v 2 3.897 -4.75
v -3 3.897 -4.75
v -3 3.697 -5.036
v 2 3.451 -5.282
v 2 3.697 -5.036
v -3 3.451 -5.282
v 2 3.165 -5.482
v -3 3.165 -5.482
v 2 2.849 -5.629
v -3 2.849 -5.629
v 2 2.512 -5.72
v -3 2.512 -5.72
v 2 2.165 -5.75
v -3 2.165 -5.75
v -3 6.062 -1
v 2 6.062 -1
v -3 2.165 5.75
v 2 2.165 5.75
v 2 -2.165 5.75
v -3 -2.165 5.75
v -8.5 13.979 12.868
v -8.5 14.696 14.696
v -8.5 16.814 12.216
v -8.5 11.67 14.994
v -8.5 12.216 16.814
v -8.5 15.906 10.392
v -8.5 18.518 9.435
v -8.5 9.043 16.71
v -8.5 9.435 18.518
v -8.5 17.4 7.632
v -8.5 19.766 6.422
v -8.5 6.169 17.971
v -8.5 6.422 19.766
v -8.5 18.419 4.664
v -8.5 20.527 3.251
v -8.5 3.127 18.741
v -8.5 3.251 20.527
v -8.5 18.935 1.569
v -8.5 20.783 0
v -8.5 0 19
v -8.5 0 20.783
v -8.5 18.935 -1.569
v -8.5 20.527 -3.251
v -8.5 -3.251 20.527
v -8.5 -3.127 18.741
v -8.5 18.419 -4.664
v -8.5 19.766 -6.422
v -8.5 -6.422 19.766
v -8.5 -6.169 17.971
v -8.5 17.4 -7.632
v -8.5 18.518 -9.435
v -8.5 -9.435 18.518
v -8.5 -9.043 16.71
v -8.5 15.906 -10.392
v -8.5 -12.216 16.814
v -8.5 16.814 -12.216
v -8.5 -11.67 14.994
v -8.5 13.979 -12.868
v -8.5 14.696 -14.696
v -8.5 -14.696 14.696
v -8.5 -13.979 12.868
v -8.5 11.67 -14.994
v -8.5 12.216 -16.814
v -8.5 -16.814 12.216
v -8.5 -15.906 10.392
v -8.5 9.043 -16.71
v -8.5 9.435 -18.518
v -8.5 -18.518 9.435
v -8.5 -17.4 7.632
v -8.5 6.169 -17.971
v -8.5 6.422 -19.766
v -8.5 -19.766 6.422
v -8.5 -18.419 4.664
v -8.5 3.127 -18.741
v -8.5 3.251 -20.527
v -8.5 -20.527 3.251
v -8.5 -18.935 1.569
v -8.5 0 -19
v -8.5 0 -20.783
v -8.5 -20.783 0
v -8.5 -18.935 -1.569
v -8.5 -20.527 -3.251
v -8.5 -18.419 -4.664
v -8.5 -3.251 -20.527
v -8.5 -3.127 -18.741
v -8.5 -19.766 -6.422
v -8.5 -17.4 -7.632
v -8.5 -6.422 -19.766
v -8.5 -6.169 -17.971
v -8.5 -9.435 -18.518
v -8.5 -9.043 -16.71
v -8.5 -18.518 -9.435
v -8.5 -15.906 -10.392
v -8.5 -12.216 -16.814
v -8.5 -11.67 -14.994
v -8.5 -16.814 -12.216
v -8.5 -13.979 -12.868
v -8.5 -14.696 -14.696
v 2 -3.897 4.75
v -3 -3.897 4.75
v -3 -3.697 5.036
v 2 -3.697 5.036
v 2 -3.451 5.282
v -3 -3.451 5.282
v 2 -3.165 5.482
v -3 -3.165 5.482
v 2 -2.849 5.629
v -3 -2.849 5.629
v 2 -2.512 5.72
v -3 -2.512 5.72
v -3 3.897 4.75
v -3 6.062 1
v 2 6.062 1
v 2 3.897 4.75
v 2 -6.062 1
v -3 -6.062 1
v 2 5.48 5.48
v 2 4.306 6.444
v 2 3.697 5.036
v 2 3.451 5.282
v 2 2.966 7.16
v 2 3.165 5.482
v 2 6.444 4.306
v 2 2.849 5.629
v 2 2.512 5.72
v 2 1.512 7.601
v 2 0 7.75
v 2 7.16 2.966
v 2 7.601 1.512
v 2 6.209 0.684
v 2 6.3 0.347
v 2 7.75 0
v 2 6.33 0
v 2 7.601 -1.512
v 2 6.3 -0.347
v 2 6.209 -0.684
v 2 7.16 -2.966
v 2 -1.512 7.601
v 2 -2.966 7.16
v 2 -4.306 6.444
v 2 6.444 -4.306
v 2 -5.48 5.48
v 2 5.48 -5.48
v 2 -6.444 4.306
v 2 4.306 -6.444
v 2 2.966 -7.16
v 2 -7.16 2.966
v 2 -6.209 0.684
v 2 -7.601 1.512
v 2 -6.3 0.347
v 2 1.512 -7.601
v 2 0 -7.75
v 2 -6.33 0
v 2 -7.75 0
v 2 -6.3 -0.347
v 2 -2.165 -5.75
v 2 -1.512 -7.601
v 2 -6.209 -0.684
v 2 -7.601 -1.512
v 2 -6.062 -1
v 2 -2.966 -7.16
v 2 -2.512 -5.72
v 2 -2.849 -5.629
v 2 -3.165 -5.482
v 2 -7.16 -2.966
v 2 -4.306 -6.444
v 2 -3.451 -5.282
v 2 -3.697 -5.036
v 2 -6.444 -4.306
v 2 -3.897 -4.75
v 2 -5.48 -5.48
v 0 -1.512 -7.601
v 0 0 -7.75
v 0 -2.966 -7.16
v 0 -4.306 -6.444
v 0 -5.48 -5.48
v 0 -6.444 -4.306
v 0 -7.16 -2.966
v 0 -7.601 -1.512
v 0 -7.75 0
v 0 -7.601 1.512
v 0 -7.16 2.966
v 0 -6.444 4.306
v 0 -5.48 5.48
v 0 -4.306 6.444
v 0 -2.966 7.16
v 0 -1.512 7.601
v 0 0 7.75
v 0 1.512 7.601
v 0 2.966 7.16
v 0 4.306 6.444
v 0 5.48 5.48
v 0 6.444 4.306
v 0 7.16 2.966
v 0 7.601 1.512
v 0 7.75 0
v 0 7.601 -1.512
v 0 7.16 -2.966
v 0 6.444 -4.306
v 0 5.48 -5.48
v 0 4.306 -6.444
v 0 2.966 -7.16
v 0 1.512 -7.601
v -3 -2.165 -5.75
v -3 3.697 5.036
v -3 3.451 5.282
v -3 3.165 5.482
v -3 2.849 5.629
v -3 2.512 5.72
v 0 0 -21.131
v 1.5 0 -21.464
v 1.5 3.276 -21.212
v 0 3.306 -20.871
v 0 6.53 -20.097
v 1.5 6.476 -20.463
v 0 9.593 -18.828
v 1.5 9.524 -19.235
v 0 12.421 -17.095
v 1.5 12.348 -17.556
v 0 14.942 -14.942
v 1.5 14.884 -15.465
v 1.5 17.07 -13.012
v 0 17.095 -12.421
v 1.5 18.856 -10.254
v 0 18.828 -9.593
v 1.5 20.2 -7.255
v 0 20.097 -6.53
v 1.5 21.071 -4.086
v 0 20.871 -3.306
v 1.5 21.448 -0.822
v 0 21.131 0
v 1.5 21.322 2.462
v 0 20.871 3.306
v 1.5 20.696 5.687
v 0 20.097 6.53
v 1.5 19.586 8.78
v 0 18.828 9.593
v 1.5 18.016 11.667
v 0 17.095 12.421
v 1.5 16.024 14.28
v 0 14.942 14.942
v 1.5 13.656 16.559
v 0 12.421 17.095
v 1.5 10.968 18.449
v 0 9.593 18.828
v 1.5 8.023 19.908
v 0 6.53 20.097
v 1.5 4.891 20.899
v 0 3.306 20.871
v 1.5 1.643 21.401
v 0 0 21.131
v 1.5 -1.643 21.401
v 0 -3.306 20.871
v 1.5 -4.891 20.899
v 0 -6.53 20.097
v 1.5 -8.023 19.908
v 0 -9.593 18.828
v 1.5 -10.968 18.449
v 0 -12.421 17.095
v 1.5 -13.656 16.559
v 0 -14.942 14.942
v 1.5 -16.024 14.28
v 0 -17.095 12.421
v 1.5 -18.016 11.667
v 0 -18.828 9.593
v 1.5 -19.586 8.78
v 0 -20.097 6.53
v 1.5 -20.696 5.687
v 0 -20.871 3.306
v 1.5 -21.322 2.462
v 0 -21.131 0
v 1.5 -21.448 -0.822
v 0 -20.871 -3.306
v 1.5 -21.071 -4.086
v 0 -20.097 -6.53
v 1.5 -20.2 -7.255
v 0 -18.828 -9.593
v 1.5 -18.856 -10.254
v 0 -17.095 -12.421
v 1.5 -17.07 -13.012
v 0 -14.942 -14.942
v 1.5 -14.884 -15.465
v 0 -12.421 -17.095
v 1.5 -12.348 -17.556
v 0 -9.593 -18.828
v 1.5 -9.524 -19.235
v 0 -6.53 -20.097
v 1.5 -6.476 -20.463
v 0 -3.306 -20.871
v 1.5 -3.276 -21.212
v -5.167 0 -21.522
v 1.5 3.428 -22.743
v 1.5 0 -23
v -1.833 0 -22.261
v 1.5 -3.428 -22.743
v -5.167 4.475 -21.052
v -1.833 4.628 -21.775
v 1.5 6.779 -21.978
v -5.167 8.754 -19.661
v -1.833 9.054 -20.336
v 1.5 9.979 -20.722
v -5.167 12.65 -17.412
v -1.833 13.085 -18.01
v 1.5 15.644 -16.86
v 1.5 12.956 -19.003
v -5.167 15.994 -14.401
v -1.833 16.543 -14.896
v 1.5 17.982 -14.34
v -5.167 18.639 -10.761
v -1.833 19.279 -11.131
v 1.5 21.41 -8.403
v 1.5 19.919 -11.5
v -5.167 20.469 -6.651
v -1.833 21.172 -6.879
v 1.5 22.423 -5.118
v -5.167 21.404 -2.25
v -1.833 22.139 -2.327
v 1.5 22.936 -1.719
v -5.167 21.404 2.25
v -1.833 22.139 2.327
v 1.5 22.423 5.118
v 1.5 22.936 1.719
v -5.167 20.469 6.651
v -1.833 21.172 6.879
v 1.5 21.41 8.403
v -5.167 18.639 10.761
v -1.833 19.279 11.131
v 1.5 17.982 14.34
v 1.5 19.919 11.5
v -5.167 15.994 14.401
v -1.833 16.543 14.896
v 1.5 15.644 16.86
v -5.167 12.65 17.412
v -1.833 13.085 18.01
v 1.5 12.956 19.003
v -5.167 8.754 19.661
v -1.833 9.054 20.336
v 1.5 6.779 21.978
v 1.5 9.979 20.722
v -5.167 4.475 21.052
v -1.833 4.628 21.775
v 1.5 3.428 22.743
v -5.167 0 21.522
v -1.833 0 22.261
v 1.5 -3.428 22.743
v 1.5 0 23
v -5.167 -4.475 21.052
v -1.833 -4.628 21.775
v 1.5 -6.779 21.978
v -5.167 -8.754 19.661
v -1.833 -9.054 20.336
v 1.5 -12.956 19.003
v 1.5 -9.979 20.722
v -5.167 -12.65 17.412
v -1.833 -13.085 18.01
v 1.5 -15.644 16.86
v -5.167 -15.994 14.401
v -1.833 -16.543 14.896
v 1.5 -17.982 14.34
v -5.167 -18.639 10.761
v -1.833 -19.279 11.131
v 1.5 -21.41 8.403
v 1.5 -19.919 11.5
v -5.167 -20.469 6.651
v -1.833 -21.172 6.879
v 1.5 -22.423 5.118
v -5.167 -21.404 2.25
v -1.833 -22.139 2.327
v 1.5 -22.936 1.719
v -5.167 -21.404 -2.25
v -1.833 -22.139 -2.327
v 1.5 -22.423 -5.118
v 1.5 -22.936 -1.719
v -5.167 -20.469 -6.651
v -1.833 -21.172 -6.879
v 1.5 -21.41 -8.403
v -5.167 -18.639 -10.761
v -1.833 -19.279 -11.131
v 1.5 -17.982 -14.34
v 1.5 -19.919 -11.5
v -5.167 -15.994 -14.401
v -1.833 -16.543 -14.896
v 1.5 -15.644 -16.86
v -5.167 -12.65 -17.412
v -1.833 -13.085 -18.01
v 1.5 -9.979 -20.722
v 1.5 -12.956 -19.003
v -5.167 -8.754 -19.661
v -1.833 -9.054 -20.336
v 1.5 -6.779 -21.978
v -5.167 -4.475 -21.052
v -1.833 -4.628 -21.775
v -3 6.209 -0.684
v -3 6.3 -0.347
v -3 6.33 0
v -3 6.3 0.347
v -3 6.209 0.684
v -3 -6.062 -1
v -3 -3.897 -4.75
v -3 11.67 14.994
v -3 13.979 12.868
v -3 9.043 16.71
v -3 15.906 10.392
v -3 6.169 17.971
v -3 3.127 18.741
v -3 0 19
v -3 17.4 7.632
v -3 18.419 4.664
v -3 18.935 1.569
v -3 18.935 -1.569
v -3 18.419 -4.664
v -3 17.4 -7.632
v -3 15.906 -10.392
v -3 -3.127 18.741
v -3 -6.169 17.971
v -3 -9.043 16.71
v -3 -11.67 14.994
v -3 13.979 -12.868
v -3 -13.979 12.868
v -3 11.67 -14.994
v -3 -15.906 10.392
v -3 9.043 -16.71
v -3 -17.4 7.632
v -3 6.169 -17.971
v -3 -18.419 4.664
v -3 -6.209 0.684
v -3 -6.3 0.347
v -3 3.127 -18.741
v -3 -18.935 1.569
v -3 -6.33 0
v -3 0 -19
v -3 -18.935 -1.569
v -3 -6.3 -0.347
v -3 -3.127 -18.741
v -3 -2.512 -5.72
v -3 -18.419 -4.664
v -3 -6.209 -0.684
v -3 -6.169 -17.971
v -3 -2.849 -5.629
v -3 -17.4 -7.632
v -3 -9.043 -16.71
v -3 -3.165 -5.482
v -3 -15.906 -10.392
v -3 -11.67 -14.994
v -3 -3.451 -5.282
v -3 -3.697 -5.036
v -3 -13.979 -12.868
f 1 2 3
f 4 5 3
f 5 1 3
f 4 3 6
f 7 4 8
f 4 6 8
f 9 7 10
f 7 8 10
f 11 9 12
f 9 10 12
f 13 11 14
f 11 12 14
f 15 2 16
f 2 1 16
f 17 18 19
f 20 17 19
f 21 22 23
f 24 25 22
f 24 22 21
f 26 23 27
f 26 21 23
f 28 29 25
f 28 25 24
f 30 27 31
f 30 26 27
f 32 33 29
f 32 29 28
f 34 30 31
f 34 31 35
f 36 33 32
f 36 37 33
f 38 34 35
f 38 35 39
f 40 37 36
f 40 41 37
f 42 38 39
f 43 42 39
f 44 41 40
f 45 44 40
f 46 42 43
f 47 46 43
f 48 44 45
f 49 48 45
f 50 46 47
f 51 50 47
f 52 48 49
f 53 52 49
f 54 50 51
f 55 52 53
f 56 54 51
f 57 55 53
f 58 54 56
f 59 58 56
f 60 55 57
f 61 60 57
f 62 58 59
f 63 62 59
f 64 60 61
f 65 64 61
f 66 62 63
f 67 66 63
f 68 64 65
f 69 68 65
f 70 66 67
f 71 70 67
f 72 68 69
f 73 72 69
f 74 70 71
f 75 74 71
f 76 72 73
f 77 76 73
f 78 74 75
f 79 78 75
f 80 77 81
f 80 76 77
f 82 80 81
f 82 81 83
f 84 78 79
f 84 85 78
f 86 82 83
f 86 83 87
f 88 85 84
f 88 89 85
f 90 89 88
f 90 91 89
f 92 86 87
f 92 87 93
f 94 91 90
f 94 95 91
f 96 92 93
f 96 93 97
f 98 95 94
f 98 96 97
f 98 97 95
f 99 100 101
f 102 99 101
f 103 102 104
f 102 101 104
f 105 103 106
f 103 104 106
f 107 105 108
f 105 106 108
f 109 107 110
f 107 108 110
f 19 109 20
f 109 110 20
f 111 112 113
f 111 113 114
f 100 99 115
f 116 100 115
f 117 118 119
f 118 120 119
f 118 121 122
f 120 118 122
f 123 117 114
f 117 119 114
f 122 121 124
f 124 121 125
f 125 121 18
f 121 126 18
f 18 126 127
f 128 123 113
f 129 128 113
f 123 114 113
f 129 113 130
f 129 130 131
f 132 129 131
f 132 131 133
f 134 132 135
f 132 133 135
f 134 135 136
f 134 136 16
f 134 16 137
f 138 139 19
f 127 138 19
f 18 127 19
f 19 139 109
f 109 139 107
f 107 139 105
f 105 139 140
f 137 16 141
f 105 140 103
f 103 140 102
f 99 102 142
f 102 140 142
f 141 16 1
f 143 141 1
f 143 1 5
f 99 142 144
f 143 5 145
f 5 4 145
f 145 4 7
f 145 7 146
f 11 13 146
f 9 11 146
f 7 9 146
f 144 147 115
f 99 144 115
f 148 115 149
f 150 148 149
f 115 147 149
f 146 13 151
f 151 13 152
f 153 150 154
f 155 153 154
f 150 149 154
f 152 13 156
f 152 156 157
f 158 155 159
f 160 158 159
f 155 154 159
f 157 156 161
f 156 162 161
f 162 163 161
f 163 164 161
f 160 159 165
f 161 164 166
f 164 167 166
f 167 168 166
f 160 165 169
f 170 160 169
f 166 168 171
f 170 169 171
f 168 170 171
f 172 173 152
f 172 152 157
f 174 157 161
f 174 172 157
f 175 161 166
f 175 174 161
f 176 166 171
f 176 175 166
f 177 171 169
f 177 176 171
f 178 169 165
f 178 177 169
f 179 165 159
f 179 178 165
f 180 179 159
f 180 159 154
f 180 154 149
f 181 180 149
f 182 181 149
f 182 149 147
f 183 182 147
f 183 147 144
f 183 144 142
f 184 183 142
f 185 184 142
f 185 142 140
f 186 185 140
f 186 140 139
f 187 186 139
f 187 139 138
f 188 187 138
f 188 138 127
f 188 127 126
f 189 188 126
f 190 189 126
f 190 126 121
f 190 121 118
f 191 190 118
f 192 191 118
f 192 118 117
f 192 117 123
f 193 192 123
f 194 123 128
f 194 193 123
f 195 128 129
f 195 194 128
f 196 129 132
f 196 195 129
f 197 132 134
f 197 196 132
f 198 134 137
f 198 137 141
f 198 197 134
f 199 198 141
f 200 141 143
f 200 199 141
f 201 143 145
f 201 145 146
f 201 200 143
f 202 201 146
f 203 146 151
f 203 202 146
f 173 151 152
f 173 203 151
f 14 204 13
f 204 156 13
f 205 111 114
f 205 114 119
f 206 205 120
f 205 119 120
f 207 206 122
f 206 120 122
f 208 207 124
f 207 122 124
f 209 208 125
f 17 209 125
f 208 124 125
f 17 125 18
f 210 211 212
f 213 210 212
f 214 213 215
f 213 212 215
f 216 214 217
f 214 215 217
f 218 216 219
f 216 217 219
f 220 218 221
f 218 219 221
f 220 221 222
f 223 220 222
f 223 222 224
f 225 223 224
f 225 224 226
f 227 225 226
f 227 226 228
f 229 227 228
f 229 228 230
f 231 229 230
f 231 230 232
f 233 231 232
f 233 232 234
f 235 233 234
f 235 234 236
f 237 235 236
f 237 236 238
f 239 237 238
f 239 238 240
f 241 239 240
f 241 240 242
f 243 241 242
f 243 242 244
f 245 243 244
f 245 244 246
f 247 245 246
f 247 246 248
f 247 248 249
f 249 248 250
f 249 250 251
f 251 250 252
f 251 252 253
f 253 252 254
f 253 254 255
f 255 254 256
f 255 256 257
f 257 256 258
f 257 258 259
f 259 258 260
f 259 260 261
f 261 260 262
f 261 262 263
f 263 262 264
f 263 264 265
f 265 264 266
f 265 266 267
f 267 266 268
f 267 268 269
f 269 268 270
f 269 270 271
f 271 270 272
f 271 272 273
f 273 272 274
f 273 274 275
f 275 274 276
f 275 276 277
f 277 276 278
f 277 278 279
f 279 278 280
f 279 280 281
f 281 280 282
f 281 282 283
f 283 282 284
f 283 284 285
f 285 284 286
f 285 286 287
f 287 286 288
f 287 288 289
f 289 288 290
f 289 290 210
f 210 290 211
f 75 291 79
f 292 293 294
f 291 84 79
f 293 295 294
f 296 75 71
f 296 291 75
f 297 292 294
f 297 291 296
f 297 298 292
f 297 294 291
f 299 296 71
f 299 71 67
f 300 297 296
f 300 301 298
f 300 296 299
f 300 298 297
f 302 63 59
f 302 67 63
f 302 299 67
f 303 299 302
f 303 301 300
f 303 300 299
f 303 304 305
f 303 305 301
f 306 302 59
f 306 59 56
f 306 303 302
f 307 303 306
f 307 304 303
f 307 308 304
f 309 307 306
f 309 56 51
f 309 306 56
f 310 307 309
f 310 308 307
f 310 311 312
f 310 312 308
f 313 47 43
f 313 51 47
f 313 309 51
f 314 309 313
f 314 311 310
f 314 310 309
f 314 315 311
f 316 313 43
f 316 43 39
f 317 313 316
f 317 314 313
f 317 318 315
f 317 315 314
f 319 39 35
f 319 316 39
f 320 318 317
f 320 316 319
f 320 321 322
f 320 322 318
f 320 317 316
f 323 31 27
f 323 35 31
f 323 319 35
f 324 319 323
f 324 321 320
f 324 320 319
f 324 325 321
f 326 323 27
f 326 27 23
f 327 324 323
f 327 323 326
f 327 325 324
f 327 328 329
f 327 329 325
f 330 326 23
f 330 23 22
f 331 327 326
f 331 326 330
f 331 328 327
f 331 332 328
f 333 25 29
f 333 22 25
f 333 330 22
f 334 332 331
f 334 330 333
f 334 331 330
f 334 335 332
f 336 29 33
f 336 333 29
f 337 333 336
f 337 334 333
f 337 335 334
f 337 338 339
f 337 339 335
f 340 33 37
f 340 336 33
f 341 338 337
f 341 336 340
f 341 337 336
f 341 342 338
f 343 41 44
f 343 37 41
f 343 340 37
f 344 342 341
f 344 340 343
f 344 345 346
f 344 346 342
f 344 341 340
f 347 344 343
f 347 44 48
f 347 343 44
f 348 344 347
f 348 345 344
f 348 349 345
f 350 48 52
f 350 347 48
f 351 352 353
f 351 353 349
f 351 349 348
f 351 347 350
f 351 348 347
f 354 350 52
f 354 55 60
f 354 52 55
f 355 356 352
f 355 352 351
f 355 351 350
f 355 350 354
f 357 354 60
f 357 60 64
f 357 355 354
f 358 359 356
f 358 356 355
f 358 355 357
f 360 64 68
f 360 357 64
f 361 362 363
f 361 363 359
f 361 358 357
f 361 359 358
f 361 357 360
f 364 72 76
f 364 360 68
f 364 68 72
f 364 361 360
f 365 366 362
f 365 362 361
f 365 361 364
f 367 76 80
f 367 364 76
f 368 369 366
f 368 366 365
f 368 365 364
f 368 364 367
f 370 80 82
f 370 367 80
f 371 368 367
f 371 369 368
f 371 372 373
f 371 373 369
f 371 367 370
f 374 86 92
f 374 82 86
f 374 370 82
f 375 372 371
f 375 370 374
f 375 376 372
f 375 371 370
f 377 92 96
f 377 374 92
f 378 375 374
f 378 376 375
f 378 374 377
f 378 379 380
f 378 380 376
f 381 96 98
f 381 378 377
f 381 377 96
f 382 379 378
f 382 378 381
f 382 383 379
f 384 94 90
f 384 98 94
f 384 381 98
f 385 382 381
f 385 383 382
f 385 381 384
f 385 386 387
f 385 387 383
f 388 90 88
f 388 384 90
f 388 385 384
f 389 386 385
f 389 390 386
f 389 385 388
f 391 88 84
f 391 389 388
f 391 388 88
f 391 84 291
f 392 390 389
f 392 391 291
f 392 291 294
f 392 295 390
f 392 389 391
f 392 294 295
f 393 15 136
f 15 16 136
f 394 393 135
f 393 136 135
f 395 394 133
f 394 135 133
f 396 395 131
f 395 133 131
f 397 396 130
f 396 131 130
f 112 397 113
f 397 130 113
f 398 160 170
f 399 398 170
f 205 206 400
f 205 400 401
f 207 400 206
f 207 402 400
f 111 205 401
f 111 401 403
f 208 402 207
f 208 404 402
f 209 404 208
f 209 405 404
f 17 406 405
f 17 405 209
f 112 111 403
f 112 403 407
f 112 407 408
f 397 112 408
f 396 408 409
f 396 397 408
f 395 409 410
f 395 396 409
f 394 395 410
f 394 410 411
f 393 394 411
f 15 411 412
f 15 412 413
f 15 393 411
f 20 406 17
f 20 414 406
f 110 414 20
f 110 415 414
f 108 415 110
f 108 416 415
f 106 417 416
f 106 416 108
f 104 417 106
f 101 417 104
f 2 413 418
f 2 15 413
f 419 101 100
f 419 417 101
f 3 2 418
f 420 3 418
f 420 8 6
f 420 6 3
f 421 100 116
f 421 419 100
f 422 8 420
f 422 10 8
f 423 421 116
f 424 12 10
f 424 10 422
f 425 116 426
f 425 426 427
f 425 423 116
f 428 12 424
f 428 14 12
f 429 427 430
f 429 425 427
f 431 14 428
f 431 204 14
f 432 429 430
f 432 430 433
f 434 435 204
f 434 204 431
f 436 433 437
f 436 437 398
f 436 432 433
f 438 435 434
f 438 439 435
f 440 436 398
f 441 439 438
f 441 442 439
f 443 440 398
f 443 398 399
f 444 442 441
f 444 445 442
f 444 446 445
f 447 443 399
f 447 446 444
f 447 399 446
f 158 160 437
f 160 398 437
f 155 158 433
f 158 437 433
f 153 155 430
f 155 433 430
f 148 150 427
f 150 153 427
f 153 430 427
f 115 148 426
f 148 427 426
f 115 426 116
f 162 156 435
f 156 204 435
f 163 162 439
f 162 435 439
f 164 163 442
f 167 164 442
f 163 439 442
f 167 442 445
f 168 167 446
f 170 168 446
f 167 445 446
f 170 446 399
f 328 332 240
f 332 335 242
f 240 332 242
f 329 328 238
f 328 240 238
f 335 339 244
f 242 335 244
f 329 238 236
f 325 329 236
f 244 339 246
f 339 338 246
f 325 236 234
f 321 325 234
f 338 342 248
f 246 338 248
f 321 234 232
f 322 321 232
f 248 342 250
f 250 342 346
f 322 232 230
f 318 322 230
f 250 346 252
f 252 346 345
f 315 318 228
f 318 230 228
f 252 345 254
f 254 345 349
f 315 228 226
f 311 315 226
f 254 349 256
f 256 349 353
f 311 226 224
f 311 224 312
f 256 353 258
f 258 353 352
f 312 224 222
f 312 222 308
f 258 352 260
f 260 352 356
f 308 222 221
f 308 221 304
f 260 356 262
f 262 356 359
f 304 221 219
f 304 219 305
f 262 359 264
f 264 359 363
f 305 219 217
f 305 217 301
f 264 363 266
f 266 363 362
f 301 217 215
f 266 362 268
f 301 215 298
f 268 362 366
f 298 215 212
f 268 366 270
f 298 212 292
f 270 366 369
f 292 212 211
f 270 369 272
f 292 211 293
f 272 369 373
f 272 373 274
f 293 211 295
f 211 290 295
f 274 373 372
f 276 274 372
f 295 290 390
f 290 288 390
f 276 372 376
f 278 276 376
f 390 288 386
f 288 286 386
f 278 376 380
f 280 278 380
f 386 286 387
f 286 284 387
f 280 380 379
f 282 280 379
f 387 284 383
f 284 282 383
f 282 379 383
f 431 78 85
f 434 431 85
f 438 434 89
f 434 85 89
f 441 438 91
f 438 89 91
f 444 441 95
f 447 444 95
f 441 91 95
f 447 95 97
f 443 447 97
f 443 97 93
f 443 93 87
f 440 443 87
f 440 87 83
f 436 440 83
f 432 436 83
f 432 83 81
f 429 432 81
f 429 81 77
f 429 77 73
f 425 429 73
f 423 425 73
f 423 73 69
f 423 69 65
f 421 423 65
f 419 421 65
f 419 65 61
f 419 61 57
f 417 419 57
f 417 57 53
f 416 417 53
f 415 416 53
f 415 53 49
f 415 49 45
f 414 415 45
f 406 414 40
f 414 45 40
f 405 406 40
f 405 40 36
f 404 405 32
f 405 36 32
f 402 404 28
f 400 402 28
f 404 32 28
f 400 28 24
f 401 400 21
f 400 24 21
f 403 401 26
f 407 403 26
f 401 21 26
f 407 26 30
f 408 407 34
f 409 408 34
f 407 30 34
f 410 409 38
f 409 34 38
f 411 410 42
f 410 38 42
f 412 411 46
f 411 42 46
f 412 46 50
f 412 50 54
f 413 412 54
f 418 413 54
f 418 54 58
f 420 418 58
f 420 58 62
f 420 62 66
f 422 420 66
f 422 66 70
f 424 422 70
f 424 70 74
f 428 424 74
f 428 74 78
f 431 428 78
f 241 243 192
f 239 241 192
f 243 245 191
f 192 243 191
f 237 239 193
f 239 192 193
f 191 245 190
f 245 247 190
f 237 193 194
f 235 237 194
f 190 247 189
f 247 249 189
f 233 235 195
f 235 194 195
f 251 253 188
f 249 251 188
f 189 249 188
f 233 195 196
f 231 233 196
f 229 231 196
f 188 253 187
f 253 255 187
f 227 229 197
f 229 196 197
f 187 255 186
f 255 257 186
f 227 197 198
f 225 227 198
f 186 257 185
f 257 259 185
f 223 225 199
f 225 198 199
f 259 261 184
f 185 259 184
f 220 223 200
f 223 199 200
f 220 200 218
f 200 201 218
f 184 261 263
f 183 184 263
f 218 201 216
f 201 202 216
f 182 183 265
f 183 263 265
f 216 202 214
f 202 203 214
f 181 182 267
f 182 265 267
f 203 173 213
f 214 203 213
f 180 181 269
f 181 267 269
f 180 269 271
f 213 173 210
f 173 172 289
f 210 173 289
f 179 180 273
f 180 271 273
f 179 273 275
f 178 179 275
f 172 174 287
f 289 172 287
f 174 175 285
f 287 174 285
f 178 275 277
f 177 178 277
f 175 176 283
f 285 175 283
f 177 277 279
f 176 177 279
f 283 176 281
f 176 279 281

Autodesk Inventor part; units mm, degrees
ref_plane "YZ Plane" through (0, 0, 0) normal (1, 0, 0) x (0, 1, 0)
ref_plane "XZ Plane" through (0, 0, 0) normal (0, 1, 0) x (-1, 0, 0)
ref_plane "XY Plane" through (0, 0, 0) normal (0, 0, 1) x (1, 0, 0)
sketch "Sketch1" plane through (0, 0, 0) normal (0, 1, 0) x (-1, 0, 0)
  line L0 (0, 0) -> (3, 0) construction
  line L1 (3, 0) -> (3, -5.75) construction
  line L2 (3, -5.75) -> (0, -5.75) construction
  line L3 (0, -5.75) -> (0, 0) construction
  line L4 (0, -5.75) -> (3, -5.75)
  line L5 (3, -5.75) -> (3, -25)
  line L6 (3, -25) -> (0, -25)
  line L7 (0, -25) -> (0, -5.75)
  line L8 (8.5, -25) -> (-1.5, -25) construction
  line L9 (-1.5, -25) -> (-1.5, -19)
  line L10 (-1.5, -19) -> (8.5, -19)
  line L11 (8.5, -19) -> (8.5, -25)
  line L12 (-1.5, -23) -> (8.5, -20.7831)
  line L13 (-1.5, -21.4636) -> (8.5, -19.2466)
  line L14 (3, -5.75) -> (5, -5.75)
  line L15 (5, -5.75) -> (5, -9.75)
  line L16 (5, -9.75) -> (3, -9.75)
  line L17 (3, -9.75) -> (3, -5.75)
  line L18 (0, -5.75) -> (-2, -5.75)
  line L19 (-2, -5.75) -> (-2, -7.75)
  line L20 (-2, -7.75) -> (0, -7.75)
  line L21 (0, -7.75) -> (0, -5.75)
  point P0 (3, -19)
  point P1 (0, -19)
  point P2 (0, -21.131)
  point P3 (3, -20.466)
  point P4 (3, -9.75)
  point P5 (0, -7.75)
  dimension "d21" = 3
  dimension "d22" = 5.75
  dimension "d24" = 1.5
  dimension "d25" = 10
  dimension "d26" = 6
  dimension "d27" = 2
  dimension "d29" = 23
  dimension "d30" = 1.5
  dimension "d34" = 2
  dimension "d35" = 4
  dimension "d36" = 2
  dimension "d37" = 2
  dimension "d38" = 12.5
revolve "Revolution1" add sketch "Sketch1" angle 360 about axis through (0, 0, 0) along (-1, 0, 0) contours L4 L5 L10 L7 | L7 L20 L19 L18 | L10 L5 L13 L7 | L10 L11 L13 L5 | L13 L5 L12 L7 | L7 L12 L9 L13 | L13 L11 L12 L5
sketch "Sketch5" plane through (-3, 0, 0) normal (-1, 0, 0) x (0, 0, 1)
  line L0 (0, 0) -> (-5.75, 0) construction
  line L1 (-5.75, 3.3198) -> (0, 6.6395)
  line L2 (0, 6.6395) -> (5.75, 3.3198)
  line L3 (5.75, 3.3198) -> (5.75, -3.3198)
  line L4 (5.75, -3.3198) -> (0, -6.6395)
  line L5 (0, -6.6395) -> (-5.75, -3.3198)
  line L6 (-5.75, -3.3198) -> (-5.75, 3.3198)
  circle A0 centre (0, 0) radius 5.75 projected
  circle A1 centre (0, 0) radius 19 projected
  circle A2 centre (0, 0) radius 5.75 projected
extrude "Extrusion4" cut sketch "Sketch5" along normal through all both and the other way through all contours L1 A0 L6 | L1 L2 A0 | A0 | A0 L5 L6 | L2 L3 A0 | A0 L4 L5 | L3 L4 A0
fillet "Fillet4" radius 2 6 edges at (-0.5, -3.3198, -5.75) (-0.5, 3.3198, -5.75) (-0.5, 6.6395, 0) (-0.5, -6.6395, 0) (-0.5, -3.3198, 5.75) (-0.5, 3.3198, 5.75)
properties part number "Clutch" material "Stainless Steel"
